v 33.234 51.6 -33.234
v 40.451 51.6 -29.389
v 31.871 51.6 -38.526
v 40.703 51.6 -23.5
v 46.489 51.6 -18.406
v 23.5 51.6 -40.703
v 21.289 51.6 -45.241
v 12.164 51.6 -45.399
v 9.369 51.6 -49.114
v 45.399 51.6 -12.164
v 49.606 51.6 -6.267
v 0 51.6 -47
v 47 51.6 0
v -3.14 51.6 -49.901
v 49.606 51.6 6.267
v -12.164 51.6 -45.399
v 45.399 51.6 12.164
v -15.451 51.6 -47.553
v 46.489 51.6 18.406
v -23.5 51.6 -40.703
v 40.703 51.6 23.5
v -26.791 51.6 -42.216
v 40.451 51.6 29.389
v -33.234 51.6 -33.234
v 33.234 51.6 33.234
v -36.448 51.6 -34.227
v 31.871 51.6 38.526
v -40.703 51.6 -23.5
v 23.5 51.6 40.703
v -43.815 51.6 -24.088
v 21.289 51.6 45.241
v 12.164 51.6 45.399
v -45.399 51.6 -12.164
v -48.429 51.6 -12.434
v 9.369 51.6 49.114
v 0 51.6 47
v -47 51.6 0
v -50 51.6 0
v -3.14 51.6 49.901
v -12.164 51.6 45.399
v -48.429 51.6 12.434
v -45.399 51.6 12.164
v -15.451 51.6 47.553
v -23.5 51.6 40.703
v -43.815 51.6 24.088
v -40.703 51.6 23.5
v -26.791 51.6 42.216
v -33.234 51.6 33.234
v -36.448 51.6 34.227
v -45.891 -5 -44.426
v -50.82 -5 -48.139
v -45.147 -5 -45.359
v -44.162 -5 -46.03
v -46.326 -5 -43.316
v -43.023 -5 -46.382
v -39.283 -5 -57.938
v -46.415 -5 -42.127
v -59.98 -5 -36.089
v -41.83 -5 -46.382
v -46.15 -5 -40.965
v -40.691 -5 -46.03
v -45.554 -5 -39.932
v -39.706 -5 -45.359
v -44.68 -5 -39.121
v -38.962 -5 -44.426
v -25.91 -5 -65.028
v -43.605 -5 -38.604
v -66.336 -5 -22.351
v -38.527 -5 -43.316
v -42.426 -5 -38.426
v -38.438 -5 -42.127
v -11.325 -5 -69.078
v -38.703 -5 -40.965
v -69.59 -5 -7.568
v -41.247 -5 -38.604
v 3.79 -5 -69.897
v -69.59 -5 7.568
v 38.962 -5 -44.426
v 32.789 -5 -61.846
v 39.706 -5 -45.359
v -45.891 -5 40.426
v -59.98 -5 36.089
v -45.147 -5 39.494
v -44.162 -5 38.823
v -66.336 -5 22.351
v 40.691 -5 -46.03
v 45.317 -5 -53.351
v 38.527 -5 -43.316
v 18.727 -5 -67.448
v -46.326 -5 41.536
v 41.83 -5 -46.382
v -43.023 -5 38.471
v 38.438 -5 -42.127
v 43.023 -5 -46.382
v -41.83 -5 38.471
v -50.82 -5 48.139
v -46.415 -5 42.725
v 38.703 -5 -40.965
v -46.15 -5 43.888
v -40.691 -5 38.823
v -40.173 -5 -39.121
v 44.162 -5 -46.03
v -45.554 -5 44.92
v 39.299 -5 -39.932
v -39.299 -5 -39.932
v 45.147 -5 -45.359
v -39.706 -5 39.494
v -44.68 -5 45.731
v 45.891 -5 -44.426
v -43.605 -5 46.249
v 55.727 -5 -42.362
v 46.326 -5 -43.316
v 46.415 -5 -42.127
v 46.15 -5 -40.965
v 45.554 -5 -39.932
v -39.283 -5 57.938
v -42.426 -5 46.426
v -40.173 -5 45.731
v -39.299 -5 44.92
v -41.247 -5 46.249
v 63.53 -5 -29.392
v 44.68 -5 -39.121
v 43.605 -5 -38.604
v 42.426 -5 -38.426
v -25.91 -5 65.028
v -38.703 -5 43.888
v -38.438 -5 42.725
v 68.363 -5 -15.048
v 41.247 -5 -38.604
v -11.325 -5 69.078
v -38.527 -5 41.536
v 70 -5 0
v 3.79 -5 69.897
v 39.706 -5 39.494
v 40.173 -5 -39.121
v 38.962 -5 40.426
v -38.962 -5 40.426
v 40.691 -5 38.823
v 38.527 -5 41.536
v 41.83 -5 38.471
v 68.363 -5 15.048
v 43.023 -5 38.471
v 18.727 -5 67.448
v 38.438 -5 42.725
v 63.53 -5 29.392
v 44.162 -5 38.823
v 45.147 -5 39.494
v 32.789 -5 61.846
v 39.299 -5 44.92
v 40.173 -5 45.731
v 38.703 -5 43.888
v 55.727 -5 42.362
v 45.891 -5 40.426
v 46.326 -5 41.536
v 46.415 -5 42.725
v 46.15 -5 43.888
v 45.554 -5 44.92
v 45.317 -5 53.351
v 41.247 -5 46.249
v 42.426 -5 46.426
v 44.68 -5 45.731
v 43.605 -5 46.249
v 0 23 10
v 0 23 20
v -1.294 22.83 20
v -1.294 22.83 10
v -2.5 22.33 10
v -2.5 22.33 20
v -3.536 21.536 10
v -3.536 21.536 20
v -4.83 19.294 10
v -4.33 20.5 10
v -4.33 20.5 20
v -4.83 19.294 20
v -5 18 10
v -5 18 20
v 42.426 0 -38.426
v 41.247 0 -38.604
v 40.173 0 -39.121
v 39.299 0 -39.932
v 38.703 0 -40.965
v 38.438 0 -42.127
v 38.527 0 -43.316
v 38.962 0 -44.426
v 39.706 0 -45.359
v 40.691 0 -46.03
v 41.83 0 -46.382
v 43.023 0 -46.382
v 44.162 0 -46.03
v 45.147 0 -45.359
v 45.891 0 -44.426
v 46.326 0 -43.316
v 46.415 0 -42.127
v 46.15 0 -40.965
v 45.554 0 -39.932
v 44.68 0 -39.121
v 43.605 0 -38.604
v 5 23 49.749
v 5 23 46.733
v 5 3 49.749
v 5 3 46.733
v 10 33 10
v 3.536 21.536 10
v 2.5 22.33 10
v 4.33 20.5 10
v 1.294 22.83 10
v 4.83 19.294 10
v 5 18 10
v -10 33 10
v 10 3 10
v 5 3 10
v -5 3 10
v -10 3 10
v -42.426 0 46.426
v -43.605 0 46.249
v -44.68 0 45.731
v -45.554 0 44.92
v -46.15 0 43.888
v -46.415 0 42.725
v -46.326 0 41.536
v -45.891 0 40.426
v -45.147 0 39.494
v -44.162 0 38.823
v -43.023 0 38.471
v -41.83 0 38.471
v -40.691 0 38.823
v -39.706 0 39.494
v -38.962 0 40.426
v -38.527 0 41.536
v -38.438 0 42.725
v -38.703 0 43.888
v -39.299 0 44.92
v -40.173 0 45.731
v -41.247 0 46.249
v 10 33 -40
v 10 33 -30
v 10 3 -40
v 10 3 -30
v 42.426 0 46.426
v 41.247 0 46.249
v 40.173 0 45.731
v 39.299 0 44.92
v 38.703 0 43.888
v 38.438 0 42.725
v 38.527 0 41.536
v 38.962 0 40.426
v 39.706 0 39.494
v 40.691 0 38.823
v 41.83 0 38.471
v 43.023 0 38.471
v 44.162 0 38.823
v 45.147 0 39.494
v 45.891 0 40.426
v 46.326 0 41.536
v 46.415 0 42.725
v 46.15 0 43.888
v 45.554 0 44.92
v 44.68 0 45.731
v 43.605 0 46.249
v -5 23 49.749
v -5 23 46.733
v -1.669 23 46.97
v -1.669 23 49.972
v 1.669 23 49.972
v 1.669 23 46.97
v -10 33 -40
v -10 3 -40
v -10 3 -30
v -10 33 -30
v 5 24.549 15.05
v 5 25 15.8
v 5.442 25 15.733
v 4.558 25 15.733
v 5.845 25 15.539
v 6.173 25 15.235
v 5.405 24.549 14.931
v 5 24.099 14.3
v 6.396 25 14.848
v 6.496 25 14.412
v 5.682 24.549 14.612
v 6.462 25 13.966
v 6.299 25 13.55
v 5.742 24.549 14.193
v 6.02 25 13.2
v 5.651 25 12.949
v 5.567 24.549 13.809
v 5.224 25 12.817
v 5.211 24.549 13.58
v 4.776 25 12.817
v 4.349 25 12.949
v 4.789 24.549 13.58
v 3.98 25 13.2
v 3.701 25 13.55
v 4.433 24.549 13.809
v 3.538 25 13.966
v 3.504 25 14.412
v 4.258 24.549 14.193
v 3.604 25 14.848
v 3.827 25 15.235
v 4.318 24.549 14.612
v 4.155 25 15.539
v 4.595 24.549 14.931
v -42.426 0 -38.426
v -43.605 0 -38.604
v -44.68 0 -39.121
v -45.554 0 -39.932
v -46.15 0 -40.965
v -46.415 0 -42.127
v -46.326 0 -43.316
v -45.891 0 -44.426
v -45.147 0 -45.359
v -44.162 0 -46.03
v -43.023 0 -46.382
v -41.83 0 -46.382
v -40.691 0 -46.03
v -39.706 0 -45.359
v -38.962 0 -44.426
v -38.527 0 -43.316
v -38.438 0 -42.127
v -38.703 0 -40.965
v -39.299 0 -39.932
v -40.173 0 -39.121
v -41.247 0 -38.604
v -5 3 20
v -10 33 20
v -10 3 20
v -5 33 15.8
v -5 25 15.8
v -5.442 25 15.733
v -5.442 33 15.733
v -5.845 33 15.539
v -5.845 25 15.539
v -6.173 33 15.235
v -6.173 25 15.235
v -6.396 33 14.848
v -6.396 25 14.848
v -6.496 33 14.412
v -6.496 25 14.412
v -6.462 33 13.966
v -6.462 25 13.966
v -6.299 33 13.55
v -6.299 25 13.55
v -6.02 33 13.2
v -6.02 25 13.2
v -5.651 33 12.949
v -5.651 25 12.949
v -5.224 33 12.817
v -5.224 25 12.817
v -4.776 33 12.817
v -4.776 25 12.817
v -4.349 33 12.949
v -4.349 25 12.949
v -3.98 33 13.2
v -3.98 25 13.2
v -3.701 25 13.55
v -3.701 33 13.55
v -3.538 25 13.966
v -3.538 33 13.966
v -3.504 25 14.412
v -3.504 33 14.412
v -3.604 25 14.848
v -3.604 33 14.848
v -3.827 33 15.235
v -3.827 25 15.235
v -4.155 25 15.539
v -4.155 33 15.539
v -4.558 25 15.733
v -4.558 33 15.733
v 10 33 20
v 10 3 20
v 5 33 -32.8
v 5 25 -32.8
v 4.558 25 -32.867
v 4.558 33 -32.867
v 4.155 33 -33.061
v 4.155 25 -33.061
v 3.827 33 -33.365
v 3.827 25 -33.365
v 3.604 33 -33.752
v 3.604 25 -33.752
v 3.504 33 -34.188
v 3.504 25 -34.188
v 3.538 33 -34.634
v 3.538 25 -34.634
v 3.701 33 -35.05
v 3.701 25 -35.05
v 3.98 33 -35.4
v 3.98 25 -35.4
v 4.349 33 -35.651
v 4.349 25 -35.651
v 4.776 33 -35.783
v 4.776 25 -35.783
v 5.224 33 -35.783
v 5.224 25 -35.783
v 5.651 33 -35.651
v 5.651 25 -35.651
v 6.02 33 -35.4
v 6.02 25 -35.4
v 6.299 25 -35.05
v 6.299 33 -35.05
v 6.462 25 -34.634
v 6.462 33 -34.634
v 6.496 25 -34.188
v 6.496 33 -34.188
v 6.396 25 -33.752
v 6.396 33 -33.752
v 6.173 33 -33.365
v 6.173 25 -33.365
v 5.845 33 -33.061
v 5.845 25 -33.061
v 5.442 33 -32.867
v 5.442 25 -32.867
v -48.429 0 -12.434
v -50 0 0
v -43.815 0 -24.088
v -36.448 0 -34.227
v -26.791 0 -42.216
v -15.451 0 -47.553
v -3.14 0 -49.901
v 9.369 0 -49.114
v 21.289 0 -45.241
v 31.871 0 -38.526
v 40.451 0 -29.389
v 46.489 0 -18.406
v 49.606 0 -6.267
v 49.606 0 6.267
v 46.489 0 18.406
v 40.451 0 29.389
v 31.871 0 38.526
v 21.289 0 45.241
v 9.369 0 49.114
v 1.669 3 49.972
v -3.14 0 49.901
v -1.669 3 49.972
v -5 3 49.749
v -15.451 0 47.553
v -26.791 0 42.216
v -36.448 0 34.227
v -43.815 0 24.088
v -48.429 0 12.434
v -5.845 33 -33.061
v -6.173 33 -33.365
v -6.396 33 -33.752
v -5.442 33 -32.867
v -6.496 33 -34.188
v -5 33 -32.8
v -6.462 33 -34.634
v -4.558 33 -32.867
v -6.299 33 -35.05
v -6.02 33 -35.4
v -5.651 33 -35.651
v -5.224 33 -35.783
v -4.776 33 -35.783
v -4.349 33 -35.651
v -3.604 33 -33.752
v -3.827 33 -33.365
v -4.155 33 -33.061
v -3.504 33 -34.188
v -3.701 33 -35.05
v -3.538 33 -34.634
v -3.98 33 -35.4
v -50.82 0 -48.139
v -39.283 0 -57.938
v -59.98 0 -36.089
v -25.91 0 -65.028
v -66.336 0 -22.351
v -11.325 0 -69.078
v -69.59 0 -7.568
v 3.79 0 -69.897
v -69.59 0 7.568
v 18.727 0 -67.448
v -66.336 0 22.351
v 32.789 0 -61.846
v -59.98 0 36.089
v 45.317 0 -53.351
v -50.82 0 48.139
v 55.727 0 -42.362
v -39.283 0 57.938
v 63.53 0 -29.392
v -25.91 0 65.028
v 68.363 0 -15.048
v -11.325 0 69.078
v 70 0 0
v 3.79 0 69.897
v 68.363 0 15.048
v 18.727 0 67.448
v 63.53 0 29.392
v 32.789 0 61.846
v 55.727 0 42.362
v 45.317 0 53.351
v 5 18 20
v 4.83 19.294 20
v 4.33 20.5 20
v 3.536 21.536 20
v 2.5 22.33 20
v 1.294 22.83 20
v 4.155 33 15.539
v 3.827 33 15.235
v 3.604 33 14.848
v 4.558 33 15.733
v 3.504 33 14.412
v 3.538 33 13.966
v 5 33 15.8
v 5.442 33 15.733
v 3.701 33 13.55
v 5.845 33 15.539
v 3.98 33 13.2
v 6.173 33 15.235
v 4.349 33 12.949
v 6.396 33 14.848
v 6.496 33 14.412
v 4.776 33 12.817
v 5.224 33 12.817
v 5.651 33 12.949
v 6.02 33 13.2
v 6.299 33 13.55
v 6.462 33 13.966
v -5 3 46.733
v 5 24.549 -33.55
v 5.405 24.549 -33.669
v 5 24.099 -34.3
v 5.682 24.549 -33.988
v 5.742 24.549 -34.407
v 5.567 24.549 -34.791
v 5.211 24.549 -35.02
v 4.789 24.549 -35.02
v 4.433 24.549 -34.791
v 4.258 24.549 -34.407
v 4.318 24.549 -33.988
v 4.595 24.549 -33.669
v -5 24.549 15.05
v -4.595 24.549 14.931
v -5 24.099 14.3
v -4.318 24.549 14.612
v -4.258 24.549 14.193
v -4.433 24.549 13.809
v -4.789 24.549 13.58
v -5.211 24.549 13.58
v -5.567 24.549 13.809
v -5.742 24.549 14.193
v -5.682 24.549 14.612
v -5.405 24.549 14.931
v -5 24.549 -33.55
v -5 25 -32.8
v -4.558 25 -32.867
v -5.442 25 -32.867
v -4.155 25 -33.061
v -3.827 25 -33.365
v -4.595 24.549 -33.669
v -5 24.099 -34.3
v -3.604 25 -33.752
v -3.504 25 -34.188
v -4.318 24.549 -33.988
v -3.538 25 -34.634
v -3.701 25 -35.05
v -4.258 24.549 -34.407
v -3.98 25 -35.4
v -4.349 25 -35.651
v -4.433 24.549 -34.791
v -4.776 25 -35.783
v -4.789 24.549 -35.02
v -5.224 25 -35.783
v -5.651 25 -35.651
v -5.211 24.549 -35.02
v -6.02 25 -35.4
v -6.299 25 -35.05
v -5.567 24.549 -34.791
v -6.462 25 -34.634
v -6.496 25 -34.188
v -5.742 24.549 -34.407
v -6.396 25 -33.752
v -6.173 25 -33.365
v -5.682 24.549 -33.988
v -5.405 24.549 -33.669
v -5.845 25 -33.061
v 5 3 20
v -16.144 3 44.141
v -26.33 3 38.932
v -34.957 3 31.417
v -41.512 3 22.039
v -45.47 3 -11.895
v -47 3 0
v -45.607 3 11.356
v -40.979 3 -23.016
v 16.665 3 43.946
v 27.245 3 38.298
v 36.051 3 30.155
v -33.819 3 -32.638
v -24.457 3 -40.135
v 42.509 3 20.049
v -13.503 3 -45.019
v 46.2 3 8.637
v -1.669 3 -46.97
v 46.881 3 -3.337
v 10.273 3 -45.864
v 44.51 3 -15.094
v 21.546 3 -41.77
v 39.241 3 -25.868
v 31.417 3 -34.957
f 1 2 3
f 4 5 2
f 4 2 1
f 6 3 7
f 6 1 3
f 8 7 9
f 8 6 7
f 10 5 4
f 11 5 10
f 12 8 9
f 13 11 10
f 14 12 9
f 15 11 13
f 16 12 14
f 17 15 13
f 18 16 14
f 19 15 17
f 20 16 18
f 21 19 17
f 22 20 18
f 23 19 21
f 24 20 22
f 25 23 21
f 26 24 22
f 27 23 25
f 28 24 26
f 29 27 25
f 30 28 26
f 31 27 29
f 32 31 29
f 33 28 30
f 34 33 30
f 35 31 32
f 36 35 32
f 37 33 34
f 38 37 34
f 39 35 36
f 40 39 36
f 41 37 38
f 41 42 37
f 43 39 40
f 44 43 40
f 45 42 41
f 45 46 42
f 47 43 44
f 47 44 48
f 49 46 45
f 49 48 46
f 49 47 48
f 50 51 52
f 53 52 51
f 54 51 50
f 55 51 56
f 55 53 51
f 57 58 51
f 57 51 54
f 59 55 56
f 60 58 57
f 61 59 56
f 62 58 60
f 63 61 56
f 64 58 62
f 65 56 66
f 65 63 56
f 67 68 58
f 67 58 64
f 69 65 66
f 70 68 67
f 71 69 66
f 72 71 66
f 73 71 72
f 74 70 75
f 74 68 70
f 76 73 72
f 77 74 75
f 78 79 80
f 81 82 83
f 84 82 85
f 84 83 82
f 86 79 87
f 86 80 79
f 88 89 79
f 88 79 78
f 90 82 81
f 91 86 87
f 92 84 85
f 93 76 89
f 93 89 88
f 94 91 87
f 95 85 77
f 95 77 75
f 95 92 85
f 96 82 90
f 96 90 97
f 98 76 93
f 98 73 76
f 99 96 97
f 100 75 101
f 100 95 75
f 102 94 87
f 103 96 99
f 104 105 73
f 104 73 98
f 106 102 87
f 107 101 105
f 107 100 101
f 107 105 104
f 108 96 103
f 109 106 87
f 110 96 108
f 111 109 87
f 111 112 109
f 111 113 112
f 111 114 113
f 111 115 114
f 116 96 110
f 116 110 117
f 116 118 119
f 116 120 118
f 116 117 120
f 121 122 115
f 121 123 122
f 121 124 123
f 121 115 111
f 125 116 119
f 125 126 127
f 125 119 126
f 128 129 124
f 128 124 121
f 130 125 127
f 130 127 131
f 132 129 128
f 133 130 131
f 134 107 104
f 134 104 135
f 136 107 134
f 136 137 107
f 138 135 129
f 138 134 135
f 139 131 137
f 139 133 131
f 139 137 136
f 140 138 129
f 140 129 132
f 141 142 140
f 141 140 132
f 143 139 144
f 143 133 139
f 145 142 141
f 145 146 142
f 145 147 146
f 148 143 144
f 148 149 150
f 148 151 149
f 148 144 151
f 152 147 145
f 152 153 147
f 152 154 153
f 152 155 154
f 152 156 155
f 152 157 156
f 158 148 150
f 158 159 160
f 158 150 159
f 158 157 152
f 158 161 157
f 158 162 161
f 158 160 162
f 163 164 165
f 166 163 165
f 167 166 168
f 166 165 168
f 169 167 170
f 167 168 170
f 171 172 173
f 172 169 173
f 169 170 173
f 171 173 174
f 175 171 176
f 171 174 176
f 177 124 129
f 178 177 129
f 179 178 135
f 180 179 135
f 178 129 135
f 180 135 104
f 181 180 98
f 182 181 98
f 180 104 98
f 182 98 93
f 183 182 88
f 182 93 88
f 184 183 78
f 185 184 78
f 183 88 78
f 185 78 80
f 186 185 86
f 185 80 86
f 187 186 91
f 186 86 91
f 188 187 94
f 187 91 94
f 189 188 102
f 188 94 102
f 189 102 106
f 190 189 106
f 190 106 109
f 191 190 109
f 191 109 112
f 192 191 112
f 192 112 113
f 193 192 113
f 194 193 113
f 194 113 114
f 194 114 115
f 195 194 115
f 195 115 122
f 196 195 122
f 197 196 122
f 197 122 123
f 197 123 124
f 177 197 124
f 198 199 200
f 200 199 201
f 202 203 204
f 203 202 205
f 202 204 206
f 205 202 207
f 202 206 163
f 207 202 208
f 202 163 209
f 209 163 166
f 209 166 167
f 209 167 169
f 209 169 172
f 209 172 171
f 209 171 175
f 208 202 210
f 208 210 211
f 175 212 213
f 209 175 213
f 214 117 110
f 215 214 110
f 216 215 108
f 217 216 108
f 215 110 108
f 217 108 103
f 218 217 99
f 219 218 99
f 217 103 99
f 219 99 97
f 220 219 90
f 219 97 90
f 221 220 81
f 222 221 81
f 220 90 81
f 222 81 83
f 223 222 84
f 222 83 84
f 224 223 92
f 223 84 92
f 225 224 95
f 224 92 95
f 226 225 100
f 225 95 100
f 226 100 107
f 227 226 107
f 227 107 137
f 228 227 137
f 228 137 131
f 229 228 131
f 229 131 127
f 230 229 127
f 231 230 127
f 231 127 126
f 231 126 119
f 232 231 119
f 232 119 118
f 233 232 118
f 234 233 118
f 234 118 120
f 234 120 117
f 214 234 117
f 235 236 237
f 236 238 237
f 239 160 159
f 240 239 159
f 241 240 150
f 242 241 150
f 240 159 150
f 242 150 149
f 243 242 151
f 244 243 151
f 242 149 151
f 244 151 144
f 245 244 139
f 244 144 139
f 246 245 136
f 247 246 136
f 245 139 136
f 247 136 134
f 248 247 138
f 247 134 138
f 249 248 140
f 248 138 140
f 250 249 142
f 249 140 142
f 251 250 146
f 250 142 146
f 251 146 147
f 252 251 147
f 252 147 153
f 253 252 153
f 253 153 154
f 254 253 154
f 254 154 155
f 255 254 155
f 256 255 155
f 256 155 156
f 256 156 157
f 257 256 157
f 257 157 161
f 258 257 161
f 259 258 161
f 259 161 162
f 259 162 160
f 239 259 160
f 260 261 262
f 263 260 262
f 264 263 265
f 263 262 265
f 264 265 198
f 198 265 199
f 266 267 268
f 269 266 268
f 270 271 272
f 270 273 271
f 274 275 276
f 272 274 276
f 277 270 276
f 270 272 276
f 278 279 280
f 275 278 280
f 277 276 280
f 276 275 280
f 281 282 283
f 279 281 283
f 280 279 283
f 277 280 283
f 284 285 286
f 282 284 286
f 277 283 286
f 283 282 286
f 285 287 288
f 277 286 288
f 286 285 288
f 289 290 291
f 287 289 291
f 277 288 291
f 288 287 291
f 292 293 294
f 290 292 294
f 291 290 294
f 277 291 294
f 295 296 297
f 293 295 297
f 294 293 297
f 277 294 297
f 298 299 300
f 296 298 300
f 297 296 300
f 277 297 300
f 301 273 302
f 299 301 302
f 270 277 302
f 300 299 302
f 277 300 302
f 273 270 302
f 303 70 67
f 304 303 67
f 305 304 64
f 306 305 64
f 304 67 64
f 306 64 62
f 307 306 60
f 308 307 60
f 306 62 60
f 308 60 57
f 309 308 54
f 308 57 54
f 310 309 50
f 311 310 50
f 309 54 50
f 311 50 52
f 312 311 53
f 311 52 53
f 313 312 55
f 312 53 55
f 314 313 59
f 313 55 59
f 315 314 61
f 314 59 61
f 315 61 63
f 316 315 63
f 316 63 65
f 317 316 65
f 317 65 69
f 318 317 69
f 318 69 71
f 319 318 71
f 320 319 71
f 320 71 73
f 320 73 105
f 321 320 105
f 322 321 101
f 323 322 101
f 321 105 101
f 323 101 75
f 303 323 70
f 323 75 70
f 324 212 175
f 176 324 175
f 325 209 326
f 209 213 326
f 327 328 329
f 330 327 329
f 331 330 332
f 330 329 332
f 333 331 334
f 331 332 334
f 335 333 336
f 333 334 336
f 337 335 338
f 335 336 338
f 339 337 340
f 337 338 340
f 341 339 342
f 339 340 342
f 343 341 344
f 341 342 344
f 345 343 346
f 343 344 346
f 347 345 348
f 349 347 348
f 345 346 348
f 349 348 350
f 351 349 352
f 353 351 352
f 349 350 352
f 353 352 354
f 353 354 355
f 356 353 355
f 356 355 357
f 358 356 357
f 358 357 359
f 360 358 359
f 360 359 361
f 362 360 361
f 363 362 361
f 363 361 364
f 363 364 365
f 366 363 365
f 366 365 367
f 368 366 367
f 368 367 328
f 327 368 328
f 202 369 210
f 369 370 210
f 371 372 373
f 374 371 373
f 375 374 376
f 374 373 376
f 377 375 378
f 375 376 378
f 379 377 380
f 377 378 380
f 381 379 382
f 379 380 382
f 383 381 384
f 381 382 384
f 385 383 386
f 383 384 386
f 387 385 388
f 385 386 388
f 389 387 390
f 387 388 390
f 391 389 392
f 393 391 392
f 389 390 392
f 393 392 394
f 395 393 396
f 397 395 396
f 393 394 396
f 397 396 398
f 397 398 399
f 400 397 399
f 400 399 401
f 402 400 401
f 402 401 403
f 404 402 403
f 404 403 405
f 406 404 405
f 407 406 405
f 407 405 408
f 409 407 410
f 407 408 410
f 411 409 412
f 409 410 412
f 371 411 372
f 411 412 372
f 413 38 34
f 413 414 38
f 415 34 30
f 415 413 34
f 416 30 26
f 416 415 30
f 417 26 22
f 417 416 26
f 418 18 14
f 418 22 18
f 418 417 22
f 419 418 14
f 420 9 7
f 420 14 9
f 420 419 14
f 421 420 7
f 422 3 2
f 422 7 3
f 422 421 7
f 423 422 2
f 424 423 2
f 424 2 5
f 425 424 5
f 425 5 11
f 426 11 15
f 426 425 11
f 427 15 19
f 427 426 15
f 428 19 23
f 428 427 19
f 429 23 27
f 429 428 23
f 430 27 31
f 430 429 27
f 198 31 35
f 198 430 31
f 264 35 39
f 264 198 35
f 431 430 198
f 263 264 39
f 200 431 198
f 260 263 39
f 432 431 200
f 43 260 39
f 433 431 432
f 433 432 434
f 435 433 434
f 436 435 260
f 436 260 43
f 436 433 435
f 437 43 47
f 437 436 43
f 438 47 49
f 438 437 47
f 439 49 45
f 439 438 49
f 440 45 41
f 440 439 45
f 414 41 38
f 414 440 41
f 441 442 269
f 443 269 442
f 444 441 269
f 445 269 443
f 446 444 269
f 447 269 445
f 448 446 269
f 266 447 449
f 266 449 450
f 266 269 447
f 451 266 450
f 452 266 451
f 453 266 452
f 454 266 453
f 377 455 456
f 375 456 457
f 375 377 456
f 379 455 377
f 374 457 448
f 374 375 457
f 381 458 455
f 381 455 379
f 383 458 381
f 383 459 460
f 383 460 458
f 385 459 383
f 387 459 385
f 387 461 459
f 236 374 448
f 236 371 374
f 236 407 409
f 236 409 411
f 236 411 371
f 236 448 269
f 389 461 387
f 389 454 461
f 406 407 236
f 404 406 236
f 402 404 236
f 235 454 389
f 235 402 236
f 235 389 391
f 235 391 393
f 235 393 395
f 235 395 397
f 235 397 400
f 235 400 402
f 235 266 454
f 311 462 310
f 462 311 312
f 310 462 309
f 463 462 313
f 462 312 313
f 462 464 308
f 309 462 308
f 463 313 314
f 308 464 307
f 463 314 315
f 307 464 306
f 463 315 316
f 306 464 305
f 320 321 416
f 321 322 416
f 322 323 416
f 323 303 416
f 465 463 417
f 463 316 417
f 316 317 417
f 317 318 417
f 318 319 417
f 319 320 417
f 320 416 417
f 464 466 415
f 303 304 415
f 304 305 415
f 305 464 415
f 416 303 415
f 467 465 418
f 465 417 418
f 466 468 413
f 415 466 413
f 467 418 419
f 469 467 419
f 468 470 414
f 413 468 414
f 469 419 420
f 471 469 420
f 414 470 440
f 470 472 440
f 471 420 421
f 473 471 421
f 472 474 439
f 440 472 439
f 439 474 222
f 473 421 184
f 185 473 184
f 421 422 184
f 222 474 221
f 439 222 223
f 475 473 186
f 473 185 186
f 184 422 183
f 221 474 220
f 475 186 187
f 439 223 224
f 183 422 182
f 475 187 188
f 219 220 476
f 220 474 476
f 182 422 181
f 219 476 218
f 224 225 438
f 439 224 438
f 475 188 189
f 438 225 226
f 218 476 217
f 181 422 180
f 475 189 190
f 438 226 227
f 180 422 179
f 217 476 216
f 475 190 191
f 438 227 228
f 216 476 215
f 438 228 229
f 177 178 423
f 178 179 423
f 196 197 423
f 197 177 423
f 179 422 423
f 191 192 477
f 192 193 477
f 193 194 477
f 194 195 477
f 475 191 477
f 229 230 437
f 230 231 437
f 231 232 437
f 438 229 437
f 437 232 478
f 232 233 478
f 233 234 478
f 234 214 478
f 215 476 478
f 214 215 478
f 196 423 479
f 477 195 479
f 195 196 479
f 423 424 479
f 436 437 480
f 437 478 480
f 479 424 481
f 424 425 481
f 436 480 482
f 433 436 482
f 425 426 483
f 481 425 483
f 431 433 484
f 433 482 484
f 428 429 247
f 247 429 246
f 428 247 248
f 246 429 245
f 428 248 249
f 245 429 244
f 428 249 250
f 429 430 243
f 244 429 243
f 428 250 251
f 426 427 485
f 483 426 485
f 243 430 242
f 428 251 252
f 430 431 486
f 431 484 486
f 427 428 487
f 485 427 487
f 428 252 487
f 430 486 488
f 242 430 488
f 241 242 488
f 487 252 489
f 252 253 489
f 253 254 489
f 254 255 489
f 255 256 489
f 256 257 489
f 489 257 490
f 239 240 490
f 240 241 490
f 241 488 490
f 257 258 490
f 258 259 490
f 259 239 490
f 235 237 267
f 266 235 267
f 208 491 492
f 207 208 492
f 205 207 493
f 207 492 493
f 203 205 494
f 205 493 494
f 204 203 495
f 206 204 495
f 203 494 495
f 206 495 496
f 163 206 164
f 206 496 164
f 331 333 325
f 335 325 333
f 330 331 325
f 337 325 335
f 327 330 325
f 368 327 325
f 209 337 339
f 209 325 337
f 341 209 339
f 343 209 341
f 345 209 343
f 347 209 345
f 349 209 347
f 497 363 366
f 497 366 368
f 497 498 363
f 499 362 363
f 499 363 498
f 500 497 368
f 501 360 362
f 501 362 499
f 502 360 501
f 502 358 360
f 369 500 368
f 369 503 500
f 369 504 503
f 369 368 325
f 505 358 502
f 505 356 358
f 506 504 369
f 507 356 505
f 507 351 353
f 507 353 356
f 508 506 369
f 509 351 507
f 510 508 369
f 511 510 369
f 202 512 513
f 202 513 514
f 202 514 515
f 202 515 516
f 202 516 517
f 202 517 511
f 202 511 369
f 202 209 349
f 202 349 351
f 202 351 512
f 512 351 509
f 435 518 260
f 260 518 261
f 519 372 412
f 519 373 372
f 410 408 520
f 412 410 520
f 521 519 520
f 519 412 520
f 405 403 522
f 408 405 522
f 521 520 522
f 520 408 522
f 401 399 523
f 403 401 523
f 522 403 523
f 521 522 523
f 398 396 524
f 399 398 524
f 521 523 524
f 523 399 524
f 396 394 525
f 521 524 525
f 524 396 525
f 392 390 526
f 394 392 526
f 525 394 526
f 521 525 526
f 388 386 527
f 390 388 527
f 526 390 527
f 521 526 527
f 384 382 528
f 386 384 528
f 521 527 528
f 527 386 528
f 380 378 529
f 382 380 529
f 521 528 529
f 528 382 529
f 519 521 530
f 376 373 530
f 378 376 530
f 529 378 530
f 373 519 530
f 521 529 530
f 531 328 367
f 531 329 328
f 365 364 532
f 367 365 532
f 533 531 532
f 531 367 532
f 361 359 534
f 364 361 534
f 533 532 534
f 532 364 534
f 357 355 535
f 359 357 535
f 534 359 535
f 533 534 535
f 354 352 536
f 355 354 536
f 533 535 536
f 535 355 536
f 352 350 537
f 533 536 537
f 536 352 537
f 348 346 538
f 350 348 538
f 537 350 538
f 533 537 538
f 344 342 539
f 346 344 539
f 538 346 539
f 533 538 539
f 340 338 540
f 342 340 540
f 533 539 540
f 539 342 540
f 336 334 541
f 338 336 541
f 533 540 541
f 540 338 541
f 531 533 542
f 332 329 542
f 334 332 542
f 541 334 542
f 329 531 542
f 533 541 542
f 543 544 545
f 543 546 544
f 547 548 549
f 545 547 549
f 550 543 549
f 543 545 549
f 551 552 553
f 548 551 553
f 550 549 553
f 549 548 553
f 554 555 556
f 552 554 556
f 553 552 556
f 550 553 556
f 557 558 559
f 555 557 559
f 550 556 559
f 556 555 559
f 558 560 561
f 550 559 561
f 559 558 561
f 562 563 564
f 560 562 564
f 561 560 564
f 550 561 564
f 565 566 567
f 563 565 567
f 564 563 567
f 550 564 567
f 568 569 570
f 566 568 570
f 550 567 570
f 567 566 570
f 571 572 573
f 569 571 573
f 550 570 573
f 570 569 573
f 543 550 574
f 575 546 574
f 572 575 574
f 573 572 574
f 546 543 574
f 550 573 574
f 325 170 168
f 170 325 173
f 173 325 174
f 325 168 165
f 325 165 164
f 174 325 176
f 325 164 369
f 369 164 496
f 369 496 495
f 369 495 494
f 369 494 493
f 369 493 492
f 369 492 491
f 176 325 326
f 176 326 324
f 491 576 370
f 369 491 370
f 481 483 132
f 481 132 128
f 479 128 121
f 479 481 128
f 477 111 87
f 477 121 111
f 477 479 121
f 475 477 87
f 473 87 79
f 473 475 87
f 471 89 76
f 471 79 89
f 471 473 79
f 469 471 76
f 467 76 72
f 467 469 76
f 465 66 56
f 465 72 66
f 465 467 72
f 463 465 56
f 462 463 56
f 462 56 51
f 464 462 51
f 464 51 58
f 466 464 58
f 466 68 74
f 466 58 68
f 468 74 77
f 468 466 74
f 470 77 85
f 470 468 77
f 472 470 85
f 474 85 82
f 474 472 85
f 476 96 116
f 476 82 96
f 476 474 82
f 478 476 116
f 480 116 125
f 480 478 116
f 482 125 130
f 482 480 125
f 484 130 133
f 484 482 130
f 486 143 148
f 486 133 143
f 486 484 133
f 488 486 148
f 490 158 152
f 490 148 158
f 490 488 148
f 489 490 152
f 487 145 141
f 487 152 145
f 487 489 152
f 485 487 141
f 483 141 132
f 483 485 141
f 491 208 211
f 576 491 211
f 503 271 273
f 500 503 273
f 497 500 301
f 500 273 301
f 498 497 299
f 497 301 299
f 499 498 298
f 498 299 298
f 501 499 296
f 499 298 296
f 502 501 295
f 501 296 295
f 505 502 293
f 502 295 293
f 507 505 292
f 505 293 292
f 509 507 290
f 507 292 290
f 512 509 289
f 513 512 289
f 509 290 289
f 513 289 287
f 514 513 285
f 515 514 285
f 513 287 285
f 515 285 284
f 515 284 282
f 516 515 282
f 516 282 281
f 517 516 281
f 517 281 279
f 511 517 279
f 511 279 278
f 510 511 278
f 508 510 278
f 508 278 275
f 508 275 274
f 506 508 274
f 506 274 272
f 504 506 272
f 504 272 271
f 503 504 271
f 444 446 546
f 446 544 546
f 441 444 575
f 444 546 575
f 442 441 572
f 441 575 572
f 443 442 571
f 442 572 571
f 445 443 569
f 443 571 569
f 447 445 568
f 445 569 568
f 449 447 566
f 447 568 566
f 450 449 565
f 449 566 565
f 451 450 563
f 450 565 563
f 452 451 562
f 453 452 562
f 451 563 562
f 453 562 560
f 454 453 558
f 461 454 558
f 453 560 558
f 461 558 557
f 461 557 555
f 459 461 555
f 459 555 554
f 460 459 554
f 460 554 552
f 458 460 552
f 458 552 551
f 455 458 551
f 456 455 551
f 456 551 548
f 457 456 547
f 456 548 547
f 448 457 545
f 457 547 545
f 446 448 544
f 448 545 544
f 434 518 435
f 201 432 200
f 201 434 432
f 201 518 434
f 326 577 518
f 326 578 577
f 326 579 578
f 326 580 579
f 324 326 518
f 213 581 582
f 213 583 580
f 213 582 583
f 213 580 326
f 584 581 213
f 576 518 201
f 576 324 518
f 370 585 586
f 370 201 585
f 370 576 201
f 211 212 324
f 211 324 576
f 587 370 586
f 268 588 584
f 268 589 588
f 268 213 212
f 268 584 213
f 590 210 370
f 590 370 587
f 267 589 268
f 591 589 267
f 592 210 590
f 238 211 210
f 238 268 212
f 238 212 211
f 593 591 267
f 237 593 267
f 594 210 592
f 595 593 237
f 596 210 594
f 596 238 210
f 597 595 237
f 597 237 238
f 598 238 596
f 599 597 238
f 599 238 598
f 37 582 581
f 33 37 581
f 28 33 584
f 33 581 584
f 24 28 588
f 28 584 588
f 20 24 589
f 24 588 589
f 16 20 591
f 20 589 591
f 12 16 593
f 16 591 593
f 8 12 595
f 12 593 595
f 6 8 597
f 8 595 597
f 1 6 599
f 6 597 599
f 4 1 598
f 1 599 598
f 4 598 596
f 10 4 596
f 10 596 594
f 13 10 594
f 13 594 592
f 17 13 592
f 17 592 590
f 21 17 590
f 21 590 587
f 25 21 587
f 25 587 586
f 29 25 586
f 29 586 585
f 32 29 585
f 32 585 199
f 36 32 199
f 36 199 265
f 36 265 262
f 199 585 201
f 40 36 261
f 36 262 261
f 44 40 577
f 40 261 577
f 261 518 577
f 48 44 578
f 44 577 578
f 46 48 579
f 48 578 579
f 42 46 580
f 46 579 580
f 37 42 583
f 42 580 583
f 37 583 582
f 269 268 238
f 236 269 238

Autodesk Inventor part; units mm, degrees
ref_plane "YZ Plane" through (0, 0, 0) normal (1, 0, 0) x (0, 1, 0)
ref_plane "XZ Plane" through (0, 0, 0) normal (0, 1, 0) x (-1, 0, 0)
ref_plane "XY Plane" through (0, 0, 0) normal (0, 0, 1) x (1, 0, 0)
sketch "草圖1" plane through (0, 0, 0) normal (0, 1, 0) x (-1, 0, 0)
  circle A0 centre (0, 0) radius 50
  dimension "d0" = 100
extrude "擠出1" add sketch "草圖1" along normal blind 51.6
shell "薄殼1" thickness 3 removed faces 1 at (-9.39, 51.6, -8.8667)
sketch "草圖2" plane through (0, 0, 0) normal (0, -1, 0) x (1, 0, 0)
  circle A0 centre (0, 0) radius 70
  dimension "d4" = 140
extrude "擠出2" add sketch "草圖2" along normal blind 5
sketch "草圖3" plane through (0, 0, 0) normal (0, 1, 0) x (1, 0, 0)
  circle A0 centre (0, 0) radius 60
  line L0 (42.4264, -42.4264) -> (-42.4264, -42.4264)
  line L1 (-42.4264, -42.4264) -> (-42.4264, 42.4264)
  line L2 (-42.4264, 42.4264) -> (42.4264, 42.4264)
  line L3 (42.4264, 42.4264) -> (42.4264, -42.4264)
  line L4 (42.4264, -42.4264) -> (-42.4264, 42.4264) construction
  line L5 (-42.4264, -42.4264) -> (42.4264, 42.4264) construction
  dimension "d7" = 120
hole "孔1" at (-42.4264, 0, 42.4264) at (-42.4264, 0, -42.4264) at (42.4264, 0, -42.4264) at (42.4264, 0, 42.4264) direction (0, -1, 0) diameter 8 depth 8 tip angle 118
sketch "草圖4" plane through (0, 3, 0) normal (0, 1, 0) x (1, 0, 0)
  line L0 (-10, -20) -> (10, -20)
  line L1 (10, -20) -> (10, -10)
  line L2 (10, -10) -> (-10, -10)
  line L3 (-10, -10) -> (-10, -20)
  line L4 (-10, 30) -> (10, 30)
  line L5 (10, 30) -> (10, 40)
  line L6 (10, 40) -> (-10, 40)
  line L7 (-10, 40) -> (-10, 30)
  point P0 (0, 0)
  dimension "d15" = 10
  dimension "d16" = 30
  dimension "d17" = 10
  dimension "d18" = 10
  dimension "d19" = 20
  dimension "d20" = 10
extrude "擠出3" add sketch "草圖4" along normal blind 30
sketch "草圖5" plane through (0, 33, 0) normal (0, 1, 0) x (1, 0, 0)
  line L0 (5, 34.3) -> (-5, 34.3)
  line L1 (-5, 34.3) -> (-5, -14.3)
  line L2 (-5, -14.3) -> (5, -14.3)
  line L3 (5, -14.3) -> (5, 34.3)
  line L4 (5, 34.3) -> (-5, -14.3) construction
  line L5 (-5, 34.3) -> (5, -14.3) construction
  line L6 (10, 30) -> (10, 40) projected
  line L7 (10, 40) -> (-10, 40) projected
  line L8 (-10, 30) -> (10, 30) projected
  line L9 (16.2048, 30) -> (16.2048, -10)
  line L10 (0, 10) -> (16.2048, 10)
  line L11 (10, -10) -> (-10, -10) projected
  dimension "d23" = 10
  dimension "d24" = 48.6
  dimension "d37" = 5
hole "孔2" at (-5, 33, 14.3) at (5, 33, 14.3) at (5, 33, -34.3) at (-5, 33, -34.3) direction (0, -1, 0) diameter 3 depth 8 tip angle 118
sketch "草圖6" plane through (10, 3, 10) normal (0, 0, -1) x (-1, 0, 0)
  line L0 (20, 0) -> (0, 0) projected
  line L1 (5, 0) -> (15, 0)
  line L2 (15, 0) -> (15, 20)
  line L3 (15, 20) -> (5, 20)
  line L4 (5, 20) -> (5, 0)
  line L5 (0, 0) -> (0, 30) projected
  line L6 (20, 0) -> (20, 30) projected
  point P0 (10, -3)
  dimension "d32" = 5
  dimension "d33" = 5
  dimension "d34" = 20
extrude "擠出4" cut sketch "草圖6" against normal through all
fillet "圓角1" radius 5 2 edges at (5, 23, 15) (-5, 23, 15)
properties part number "底座" material "熱塑性塑膠樹脂"
